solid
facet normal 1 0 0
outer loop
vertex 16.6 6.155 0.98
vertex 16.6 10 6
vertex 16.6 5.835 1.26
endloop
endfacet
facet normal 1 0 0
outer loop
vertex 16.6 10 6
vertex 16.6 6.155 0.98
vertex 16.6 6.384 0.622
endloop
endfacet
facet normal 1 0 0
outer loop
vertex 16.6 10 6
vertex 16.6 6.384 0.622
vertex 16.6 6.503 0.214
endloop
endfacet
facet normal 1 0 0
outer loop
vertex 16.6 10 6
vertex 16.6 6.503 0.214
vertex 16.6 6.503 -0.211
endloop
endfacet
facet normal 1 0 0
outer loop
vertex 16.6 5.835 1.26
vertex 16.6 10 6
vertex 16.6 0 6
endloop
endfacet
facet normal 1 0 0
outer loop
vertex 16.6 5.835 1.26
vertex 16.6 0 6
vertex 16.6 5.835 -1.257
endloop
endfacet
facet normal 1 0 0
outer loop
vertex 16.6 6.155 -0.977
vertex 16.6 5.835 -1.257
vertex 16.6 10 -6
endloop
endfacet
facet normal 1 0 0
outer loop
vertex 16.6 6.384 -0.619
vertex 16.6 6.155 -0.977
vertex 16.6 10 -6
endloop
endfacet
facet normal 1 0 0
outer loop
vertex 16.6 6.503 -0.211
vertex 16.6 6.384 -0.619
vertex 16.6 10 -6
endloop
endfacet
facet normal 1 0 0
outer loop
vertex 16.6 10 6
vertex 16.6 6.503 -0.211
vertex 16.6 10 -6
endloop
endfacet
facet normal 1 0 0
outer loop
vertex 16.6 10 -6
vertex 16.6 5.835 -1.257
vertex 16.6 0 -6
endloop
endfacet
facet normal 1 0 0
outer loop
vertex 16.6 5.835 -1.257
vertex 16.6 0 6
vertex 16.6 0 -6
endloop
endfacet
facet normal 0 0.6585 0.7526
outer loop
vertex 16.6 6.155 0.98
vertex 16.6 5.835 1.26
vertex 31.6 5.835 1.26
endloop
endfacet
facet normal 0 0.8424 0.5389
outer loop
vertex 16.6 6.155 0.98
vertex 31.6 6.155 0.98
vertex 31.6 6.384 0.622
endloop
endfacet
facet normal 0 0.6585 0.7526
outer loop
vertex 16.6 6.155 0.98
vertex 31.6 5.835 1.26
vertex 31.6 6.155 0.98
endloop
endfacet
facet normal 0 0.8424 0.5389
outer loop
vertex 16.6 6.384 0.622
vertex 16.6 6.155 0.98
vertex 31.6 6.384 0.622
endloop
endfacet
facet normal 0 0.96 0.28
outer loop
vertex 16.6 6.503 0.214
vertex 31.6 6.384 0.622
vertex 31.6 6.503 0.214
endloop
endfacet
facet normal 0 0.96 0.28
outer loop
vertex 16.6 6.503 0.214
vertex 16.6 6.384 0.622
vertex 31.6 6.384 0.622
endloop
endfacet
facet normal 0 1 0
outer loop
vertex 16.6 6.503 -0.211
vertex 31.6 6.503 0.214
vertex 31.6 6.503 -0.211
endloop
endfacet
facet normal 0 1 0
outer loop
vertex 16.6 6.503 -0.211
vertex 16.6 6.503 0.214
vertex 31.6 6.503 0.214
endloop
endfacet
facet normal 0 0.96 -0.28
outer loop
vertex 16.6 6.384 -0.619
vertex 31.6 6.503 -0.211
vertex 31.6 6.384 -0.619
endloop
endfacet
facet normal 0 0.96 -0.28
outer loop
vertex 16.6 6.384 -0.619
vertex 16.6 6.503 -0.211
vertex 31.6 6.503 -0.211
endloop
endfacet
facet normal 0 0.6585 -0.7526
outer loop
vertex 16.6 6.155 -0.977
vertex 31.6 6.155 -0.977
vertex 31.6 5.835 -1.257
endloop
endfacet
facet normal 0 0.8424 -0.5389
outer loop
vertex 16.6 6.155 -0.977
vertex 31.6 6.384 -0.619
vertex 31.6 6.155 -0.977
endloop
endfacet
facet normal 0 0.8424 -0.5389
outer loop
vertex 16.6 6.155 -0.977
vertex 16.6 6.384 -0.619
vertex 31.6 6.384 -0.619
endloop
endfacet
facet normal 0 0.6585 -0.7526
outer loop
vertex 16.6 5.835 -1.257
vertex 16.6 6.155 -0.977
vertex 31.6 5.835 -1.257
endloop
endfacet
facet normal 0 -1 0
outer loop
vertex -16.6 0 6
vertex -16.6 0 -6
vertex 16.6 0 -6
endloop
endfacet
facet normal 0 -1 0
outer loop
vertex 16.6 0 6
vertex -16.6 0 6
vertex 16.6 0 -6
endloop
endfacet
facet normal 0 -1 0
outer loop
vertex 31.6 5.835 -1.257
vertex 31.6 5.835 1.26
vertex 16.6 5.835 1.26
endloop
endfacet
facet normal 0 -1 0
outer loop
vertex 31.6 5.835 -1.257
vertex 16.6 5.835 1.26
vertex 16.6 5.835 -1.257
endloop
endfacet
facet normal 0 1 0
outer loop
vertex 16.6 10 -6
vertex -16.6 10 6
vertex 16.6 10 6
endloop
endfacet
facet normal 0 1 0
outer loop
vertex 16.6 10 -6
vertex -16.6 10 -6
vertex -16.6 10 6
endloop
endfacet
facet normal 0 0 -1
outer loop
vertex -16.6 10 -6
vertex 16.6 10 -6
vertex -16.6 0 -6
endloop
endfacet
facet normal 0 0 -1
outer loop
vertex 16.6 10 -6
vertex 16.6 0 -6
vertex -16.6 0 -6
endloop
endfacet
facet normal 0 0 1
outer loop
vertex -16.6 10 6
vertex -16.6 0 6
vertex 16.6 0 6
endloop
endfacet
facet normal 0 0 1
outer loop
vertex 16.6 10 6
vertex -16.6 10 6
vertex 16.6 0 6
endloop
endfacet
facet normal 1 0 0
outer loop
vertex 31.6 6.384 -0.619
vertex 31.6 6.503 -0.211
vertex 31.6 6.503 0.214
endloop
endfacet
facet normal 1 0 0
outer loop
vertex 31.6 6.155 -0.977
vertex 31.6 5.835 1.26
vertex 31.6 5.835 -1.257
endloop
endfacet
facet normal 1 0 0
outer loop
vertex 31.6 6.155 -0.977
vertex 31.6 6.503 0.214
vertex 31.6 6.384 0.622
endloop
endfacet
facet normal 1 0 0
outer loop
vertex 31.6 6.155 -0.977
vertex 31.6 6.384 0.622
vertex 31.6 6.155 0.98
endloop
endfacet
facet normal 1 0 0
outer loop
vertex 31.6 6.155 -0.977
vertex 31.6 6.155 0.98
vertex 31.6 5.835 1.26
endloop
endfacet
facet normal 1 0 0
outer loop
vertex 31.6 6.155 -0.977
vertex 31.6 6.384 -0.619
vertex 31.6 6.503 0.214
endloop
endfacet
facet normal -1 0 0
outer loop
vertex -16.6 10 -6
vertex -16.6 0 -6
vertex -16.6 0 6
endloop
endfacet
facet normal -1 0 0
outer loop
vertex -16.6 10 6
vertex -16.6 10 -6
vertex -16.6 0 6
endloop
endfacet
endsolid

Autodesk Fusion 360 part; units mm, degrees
sketch "Sketch1" plane through (0, 0, 0) normal (1, 0, 0) x (0, 0, -1)
  circle A0 centre (0, 0) radius 40
  line L0 (-2.9, 1.75) -> (2.9, 1.75)
  line L1 (2.9, 1.75) -> (2.9, -1.75)
  line L2 (2.9, -1.75) -> (-2.9, -1.75)
  line L3 (-2.9, -1.75) -> (-2.9, 1.75)
  line L4 (-2.9, 1.75) -> (2.9, -1.75) construction
  line L5 (2.9, 1.75) -> (-2.9, -1.75) construction
  dimension "d1" = 80
  dimension "d2" = 5.8
  dimension "d3" = 3.5
sketch "Sketch2" plane through (0, 0, 0) normal (0, 1, 0) x (1, 0, 0)
  line L0 (16.6, 6) -> (-16.6, 6)
  line L1 (-16.6, 6) -> (-16.6, -6)
  line L2 (-16.6, -6) -> (16.6, -6)
  line L3 (16.6, -6) -> (16.6, 6)
  line L4 (16.6, 6) -> (-16.6, -6) construction
  line L5 (-16.6, 6) -> (16.6, -6) construction
  dimension "d6" = 33.2
  dimension "d7" = 12
extrude "Extrude2" add sketch "Sketch2" along normal blind 10 makes body 1
sketch "Sketch3" plane through (16.6, 0, 0) normal (1, 0, 0) x (0, 0, -1)
  line L0 (-6, 0) -> (6, 0)
  line L1 (6, 0) -> (6, 10)
  line L2 (6, 10) -> (-6, 10)
  line L3 (-6, 10) -> (-6, 0)
  circle A0 centre (-0.0016, 5.0186) radius 1.5
  line L4 (-1.2598, 5.8353) -> (1.2566, 5.8353)
  dimension "d10" = 3
extrude "Extrude3" add sketch "Sketch3" along normal blind 15 contours A0 L4 picked at (-0.2512, 6.075) bodies 1
sketch "Sketch4" plane through (0, 0, 0) normal (1, 0, 0) x (0, 0, -1)
  circle A0 centre (0, 0) radius 30
  dimension "d13" = 60
extrude "Extrude4" add sketch "Sketch4" along normal blind 8 separate body makes body 2
sketch "Sketch5" plane through (0, 0, 0) normal (-1, 0, 0) x (0, 0, 1)
  circle A0 centre (0, 0) radius 30
  circle A1 centre (0, 0) radius 1.5
  line L0 (-1.26, 0.8139) -> (1.26, 0.8139)
  dimension "d20" = 3
  dimension "d21" = 2.52
extrude "Extrude5" cut sketch "Sketch5" against normal blind 14 contours A1 L0 picked at (0.3772, 0.8708) bodies 2
copy_body "Body->Comp1" bodies 2 removing the originals makes body 3 in component "Component"
component "Component" placed x (1, 0, 0) y (0, 1, 0) z (0, 0, 1) at (0, 0, 0)
hidden bodies 3
